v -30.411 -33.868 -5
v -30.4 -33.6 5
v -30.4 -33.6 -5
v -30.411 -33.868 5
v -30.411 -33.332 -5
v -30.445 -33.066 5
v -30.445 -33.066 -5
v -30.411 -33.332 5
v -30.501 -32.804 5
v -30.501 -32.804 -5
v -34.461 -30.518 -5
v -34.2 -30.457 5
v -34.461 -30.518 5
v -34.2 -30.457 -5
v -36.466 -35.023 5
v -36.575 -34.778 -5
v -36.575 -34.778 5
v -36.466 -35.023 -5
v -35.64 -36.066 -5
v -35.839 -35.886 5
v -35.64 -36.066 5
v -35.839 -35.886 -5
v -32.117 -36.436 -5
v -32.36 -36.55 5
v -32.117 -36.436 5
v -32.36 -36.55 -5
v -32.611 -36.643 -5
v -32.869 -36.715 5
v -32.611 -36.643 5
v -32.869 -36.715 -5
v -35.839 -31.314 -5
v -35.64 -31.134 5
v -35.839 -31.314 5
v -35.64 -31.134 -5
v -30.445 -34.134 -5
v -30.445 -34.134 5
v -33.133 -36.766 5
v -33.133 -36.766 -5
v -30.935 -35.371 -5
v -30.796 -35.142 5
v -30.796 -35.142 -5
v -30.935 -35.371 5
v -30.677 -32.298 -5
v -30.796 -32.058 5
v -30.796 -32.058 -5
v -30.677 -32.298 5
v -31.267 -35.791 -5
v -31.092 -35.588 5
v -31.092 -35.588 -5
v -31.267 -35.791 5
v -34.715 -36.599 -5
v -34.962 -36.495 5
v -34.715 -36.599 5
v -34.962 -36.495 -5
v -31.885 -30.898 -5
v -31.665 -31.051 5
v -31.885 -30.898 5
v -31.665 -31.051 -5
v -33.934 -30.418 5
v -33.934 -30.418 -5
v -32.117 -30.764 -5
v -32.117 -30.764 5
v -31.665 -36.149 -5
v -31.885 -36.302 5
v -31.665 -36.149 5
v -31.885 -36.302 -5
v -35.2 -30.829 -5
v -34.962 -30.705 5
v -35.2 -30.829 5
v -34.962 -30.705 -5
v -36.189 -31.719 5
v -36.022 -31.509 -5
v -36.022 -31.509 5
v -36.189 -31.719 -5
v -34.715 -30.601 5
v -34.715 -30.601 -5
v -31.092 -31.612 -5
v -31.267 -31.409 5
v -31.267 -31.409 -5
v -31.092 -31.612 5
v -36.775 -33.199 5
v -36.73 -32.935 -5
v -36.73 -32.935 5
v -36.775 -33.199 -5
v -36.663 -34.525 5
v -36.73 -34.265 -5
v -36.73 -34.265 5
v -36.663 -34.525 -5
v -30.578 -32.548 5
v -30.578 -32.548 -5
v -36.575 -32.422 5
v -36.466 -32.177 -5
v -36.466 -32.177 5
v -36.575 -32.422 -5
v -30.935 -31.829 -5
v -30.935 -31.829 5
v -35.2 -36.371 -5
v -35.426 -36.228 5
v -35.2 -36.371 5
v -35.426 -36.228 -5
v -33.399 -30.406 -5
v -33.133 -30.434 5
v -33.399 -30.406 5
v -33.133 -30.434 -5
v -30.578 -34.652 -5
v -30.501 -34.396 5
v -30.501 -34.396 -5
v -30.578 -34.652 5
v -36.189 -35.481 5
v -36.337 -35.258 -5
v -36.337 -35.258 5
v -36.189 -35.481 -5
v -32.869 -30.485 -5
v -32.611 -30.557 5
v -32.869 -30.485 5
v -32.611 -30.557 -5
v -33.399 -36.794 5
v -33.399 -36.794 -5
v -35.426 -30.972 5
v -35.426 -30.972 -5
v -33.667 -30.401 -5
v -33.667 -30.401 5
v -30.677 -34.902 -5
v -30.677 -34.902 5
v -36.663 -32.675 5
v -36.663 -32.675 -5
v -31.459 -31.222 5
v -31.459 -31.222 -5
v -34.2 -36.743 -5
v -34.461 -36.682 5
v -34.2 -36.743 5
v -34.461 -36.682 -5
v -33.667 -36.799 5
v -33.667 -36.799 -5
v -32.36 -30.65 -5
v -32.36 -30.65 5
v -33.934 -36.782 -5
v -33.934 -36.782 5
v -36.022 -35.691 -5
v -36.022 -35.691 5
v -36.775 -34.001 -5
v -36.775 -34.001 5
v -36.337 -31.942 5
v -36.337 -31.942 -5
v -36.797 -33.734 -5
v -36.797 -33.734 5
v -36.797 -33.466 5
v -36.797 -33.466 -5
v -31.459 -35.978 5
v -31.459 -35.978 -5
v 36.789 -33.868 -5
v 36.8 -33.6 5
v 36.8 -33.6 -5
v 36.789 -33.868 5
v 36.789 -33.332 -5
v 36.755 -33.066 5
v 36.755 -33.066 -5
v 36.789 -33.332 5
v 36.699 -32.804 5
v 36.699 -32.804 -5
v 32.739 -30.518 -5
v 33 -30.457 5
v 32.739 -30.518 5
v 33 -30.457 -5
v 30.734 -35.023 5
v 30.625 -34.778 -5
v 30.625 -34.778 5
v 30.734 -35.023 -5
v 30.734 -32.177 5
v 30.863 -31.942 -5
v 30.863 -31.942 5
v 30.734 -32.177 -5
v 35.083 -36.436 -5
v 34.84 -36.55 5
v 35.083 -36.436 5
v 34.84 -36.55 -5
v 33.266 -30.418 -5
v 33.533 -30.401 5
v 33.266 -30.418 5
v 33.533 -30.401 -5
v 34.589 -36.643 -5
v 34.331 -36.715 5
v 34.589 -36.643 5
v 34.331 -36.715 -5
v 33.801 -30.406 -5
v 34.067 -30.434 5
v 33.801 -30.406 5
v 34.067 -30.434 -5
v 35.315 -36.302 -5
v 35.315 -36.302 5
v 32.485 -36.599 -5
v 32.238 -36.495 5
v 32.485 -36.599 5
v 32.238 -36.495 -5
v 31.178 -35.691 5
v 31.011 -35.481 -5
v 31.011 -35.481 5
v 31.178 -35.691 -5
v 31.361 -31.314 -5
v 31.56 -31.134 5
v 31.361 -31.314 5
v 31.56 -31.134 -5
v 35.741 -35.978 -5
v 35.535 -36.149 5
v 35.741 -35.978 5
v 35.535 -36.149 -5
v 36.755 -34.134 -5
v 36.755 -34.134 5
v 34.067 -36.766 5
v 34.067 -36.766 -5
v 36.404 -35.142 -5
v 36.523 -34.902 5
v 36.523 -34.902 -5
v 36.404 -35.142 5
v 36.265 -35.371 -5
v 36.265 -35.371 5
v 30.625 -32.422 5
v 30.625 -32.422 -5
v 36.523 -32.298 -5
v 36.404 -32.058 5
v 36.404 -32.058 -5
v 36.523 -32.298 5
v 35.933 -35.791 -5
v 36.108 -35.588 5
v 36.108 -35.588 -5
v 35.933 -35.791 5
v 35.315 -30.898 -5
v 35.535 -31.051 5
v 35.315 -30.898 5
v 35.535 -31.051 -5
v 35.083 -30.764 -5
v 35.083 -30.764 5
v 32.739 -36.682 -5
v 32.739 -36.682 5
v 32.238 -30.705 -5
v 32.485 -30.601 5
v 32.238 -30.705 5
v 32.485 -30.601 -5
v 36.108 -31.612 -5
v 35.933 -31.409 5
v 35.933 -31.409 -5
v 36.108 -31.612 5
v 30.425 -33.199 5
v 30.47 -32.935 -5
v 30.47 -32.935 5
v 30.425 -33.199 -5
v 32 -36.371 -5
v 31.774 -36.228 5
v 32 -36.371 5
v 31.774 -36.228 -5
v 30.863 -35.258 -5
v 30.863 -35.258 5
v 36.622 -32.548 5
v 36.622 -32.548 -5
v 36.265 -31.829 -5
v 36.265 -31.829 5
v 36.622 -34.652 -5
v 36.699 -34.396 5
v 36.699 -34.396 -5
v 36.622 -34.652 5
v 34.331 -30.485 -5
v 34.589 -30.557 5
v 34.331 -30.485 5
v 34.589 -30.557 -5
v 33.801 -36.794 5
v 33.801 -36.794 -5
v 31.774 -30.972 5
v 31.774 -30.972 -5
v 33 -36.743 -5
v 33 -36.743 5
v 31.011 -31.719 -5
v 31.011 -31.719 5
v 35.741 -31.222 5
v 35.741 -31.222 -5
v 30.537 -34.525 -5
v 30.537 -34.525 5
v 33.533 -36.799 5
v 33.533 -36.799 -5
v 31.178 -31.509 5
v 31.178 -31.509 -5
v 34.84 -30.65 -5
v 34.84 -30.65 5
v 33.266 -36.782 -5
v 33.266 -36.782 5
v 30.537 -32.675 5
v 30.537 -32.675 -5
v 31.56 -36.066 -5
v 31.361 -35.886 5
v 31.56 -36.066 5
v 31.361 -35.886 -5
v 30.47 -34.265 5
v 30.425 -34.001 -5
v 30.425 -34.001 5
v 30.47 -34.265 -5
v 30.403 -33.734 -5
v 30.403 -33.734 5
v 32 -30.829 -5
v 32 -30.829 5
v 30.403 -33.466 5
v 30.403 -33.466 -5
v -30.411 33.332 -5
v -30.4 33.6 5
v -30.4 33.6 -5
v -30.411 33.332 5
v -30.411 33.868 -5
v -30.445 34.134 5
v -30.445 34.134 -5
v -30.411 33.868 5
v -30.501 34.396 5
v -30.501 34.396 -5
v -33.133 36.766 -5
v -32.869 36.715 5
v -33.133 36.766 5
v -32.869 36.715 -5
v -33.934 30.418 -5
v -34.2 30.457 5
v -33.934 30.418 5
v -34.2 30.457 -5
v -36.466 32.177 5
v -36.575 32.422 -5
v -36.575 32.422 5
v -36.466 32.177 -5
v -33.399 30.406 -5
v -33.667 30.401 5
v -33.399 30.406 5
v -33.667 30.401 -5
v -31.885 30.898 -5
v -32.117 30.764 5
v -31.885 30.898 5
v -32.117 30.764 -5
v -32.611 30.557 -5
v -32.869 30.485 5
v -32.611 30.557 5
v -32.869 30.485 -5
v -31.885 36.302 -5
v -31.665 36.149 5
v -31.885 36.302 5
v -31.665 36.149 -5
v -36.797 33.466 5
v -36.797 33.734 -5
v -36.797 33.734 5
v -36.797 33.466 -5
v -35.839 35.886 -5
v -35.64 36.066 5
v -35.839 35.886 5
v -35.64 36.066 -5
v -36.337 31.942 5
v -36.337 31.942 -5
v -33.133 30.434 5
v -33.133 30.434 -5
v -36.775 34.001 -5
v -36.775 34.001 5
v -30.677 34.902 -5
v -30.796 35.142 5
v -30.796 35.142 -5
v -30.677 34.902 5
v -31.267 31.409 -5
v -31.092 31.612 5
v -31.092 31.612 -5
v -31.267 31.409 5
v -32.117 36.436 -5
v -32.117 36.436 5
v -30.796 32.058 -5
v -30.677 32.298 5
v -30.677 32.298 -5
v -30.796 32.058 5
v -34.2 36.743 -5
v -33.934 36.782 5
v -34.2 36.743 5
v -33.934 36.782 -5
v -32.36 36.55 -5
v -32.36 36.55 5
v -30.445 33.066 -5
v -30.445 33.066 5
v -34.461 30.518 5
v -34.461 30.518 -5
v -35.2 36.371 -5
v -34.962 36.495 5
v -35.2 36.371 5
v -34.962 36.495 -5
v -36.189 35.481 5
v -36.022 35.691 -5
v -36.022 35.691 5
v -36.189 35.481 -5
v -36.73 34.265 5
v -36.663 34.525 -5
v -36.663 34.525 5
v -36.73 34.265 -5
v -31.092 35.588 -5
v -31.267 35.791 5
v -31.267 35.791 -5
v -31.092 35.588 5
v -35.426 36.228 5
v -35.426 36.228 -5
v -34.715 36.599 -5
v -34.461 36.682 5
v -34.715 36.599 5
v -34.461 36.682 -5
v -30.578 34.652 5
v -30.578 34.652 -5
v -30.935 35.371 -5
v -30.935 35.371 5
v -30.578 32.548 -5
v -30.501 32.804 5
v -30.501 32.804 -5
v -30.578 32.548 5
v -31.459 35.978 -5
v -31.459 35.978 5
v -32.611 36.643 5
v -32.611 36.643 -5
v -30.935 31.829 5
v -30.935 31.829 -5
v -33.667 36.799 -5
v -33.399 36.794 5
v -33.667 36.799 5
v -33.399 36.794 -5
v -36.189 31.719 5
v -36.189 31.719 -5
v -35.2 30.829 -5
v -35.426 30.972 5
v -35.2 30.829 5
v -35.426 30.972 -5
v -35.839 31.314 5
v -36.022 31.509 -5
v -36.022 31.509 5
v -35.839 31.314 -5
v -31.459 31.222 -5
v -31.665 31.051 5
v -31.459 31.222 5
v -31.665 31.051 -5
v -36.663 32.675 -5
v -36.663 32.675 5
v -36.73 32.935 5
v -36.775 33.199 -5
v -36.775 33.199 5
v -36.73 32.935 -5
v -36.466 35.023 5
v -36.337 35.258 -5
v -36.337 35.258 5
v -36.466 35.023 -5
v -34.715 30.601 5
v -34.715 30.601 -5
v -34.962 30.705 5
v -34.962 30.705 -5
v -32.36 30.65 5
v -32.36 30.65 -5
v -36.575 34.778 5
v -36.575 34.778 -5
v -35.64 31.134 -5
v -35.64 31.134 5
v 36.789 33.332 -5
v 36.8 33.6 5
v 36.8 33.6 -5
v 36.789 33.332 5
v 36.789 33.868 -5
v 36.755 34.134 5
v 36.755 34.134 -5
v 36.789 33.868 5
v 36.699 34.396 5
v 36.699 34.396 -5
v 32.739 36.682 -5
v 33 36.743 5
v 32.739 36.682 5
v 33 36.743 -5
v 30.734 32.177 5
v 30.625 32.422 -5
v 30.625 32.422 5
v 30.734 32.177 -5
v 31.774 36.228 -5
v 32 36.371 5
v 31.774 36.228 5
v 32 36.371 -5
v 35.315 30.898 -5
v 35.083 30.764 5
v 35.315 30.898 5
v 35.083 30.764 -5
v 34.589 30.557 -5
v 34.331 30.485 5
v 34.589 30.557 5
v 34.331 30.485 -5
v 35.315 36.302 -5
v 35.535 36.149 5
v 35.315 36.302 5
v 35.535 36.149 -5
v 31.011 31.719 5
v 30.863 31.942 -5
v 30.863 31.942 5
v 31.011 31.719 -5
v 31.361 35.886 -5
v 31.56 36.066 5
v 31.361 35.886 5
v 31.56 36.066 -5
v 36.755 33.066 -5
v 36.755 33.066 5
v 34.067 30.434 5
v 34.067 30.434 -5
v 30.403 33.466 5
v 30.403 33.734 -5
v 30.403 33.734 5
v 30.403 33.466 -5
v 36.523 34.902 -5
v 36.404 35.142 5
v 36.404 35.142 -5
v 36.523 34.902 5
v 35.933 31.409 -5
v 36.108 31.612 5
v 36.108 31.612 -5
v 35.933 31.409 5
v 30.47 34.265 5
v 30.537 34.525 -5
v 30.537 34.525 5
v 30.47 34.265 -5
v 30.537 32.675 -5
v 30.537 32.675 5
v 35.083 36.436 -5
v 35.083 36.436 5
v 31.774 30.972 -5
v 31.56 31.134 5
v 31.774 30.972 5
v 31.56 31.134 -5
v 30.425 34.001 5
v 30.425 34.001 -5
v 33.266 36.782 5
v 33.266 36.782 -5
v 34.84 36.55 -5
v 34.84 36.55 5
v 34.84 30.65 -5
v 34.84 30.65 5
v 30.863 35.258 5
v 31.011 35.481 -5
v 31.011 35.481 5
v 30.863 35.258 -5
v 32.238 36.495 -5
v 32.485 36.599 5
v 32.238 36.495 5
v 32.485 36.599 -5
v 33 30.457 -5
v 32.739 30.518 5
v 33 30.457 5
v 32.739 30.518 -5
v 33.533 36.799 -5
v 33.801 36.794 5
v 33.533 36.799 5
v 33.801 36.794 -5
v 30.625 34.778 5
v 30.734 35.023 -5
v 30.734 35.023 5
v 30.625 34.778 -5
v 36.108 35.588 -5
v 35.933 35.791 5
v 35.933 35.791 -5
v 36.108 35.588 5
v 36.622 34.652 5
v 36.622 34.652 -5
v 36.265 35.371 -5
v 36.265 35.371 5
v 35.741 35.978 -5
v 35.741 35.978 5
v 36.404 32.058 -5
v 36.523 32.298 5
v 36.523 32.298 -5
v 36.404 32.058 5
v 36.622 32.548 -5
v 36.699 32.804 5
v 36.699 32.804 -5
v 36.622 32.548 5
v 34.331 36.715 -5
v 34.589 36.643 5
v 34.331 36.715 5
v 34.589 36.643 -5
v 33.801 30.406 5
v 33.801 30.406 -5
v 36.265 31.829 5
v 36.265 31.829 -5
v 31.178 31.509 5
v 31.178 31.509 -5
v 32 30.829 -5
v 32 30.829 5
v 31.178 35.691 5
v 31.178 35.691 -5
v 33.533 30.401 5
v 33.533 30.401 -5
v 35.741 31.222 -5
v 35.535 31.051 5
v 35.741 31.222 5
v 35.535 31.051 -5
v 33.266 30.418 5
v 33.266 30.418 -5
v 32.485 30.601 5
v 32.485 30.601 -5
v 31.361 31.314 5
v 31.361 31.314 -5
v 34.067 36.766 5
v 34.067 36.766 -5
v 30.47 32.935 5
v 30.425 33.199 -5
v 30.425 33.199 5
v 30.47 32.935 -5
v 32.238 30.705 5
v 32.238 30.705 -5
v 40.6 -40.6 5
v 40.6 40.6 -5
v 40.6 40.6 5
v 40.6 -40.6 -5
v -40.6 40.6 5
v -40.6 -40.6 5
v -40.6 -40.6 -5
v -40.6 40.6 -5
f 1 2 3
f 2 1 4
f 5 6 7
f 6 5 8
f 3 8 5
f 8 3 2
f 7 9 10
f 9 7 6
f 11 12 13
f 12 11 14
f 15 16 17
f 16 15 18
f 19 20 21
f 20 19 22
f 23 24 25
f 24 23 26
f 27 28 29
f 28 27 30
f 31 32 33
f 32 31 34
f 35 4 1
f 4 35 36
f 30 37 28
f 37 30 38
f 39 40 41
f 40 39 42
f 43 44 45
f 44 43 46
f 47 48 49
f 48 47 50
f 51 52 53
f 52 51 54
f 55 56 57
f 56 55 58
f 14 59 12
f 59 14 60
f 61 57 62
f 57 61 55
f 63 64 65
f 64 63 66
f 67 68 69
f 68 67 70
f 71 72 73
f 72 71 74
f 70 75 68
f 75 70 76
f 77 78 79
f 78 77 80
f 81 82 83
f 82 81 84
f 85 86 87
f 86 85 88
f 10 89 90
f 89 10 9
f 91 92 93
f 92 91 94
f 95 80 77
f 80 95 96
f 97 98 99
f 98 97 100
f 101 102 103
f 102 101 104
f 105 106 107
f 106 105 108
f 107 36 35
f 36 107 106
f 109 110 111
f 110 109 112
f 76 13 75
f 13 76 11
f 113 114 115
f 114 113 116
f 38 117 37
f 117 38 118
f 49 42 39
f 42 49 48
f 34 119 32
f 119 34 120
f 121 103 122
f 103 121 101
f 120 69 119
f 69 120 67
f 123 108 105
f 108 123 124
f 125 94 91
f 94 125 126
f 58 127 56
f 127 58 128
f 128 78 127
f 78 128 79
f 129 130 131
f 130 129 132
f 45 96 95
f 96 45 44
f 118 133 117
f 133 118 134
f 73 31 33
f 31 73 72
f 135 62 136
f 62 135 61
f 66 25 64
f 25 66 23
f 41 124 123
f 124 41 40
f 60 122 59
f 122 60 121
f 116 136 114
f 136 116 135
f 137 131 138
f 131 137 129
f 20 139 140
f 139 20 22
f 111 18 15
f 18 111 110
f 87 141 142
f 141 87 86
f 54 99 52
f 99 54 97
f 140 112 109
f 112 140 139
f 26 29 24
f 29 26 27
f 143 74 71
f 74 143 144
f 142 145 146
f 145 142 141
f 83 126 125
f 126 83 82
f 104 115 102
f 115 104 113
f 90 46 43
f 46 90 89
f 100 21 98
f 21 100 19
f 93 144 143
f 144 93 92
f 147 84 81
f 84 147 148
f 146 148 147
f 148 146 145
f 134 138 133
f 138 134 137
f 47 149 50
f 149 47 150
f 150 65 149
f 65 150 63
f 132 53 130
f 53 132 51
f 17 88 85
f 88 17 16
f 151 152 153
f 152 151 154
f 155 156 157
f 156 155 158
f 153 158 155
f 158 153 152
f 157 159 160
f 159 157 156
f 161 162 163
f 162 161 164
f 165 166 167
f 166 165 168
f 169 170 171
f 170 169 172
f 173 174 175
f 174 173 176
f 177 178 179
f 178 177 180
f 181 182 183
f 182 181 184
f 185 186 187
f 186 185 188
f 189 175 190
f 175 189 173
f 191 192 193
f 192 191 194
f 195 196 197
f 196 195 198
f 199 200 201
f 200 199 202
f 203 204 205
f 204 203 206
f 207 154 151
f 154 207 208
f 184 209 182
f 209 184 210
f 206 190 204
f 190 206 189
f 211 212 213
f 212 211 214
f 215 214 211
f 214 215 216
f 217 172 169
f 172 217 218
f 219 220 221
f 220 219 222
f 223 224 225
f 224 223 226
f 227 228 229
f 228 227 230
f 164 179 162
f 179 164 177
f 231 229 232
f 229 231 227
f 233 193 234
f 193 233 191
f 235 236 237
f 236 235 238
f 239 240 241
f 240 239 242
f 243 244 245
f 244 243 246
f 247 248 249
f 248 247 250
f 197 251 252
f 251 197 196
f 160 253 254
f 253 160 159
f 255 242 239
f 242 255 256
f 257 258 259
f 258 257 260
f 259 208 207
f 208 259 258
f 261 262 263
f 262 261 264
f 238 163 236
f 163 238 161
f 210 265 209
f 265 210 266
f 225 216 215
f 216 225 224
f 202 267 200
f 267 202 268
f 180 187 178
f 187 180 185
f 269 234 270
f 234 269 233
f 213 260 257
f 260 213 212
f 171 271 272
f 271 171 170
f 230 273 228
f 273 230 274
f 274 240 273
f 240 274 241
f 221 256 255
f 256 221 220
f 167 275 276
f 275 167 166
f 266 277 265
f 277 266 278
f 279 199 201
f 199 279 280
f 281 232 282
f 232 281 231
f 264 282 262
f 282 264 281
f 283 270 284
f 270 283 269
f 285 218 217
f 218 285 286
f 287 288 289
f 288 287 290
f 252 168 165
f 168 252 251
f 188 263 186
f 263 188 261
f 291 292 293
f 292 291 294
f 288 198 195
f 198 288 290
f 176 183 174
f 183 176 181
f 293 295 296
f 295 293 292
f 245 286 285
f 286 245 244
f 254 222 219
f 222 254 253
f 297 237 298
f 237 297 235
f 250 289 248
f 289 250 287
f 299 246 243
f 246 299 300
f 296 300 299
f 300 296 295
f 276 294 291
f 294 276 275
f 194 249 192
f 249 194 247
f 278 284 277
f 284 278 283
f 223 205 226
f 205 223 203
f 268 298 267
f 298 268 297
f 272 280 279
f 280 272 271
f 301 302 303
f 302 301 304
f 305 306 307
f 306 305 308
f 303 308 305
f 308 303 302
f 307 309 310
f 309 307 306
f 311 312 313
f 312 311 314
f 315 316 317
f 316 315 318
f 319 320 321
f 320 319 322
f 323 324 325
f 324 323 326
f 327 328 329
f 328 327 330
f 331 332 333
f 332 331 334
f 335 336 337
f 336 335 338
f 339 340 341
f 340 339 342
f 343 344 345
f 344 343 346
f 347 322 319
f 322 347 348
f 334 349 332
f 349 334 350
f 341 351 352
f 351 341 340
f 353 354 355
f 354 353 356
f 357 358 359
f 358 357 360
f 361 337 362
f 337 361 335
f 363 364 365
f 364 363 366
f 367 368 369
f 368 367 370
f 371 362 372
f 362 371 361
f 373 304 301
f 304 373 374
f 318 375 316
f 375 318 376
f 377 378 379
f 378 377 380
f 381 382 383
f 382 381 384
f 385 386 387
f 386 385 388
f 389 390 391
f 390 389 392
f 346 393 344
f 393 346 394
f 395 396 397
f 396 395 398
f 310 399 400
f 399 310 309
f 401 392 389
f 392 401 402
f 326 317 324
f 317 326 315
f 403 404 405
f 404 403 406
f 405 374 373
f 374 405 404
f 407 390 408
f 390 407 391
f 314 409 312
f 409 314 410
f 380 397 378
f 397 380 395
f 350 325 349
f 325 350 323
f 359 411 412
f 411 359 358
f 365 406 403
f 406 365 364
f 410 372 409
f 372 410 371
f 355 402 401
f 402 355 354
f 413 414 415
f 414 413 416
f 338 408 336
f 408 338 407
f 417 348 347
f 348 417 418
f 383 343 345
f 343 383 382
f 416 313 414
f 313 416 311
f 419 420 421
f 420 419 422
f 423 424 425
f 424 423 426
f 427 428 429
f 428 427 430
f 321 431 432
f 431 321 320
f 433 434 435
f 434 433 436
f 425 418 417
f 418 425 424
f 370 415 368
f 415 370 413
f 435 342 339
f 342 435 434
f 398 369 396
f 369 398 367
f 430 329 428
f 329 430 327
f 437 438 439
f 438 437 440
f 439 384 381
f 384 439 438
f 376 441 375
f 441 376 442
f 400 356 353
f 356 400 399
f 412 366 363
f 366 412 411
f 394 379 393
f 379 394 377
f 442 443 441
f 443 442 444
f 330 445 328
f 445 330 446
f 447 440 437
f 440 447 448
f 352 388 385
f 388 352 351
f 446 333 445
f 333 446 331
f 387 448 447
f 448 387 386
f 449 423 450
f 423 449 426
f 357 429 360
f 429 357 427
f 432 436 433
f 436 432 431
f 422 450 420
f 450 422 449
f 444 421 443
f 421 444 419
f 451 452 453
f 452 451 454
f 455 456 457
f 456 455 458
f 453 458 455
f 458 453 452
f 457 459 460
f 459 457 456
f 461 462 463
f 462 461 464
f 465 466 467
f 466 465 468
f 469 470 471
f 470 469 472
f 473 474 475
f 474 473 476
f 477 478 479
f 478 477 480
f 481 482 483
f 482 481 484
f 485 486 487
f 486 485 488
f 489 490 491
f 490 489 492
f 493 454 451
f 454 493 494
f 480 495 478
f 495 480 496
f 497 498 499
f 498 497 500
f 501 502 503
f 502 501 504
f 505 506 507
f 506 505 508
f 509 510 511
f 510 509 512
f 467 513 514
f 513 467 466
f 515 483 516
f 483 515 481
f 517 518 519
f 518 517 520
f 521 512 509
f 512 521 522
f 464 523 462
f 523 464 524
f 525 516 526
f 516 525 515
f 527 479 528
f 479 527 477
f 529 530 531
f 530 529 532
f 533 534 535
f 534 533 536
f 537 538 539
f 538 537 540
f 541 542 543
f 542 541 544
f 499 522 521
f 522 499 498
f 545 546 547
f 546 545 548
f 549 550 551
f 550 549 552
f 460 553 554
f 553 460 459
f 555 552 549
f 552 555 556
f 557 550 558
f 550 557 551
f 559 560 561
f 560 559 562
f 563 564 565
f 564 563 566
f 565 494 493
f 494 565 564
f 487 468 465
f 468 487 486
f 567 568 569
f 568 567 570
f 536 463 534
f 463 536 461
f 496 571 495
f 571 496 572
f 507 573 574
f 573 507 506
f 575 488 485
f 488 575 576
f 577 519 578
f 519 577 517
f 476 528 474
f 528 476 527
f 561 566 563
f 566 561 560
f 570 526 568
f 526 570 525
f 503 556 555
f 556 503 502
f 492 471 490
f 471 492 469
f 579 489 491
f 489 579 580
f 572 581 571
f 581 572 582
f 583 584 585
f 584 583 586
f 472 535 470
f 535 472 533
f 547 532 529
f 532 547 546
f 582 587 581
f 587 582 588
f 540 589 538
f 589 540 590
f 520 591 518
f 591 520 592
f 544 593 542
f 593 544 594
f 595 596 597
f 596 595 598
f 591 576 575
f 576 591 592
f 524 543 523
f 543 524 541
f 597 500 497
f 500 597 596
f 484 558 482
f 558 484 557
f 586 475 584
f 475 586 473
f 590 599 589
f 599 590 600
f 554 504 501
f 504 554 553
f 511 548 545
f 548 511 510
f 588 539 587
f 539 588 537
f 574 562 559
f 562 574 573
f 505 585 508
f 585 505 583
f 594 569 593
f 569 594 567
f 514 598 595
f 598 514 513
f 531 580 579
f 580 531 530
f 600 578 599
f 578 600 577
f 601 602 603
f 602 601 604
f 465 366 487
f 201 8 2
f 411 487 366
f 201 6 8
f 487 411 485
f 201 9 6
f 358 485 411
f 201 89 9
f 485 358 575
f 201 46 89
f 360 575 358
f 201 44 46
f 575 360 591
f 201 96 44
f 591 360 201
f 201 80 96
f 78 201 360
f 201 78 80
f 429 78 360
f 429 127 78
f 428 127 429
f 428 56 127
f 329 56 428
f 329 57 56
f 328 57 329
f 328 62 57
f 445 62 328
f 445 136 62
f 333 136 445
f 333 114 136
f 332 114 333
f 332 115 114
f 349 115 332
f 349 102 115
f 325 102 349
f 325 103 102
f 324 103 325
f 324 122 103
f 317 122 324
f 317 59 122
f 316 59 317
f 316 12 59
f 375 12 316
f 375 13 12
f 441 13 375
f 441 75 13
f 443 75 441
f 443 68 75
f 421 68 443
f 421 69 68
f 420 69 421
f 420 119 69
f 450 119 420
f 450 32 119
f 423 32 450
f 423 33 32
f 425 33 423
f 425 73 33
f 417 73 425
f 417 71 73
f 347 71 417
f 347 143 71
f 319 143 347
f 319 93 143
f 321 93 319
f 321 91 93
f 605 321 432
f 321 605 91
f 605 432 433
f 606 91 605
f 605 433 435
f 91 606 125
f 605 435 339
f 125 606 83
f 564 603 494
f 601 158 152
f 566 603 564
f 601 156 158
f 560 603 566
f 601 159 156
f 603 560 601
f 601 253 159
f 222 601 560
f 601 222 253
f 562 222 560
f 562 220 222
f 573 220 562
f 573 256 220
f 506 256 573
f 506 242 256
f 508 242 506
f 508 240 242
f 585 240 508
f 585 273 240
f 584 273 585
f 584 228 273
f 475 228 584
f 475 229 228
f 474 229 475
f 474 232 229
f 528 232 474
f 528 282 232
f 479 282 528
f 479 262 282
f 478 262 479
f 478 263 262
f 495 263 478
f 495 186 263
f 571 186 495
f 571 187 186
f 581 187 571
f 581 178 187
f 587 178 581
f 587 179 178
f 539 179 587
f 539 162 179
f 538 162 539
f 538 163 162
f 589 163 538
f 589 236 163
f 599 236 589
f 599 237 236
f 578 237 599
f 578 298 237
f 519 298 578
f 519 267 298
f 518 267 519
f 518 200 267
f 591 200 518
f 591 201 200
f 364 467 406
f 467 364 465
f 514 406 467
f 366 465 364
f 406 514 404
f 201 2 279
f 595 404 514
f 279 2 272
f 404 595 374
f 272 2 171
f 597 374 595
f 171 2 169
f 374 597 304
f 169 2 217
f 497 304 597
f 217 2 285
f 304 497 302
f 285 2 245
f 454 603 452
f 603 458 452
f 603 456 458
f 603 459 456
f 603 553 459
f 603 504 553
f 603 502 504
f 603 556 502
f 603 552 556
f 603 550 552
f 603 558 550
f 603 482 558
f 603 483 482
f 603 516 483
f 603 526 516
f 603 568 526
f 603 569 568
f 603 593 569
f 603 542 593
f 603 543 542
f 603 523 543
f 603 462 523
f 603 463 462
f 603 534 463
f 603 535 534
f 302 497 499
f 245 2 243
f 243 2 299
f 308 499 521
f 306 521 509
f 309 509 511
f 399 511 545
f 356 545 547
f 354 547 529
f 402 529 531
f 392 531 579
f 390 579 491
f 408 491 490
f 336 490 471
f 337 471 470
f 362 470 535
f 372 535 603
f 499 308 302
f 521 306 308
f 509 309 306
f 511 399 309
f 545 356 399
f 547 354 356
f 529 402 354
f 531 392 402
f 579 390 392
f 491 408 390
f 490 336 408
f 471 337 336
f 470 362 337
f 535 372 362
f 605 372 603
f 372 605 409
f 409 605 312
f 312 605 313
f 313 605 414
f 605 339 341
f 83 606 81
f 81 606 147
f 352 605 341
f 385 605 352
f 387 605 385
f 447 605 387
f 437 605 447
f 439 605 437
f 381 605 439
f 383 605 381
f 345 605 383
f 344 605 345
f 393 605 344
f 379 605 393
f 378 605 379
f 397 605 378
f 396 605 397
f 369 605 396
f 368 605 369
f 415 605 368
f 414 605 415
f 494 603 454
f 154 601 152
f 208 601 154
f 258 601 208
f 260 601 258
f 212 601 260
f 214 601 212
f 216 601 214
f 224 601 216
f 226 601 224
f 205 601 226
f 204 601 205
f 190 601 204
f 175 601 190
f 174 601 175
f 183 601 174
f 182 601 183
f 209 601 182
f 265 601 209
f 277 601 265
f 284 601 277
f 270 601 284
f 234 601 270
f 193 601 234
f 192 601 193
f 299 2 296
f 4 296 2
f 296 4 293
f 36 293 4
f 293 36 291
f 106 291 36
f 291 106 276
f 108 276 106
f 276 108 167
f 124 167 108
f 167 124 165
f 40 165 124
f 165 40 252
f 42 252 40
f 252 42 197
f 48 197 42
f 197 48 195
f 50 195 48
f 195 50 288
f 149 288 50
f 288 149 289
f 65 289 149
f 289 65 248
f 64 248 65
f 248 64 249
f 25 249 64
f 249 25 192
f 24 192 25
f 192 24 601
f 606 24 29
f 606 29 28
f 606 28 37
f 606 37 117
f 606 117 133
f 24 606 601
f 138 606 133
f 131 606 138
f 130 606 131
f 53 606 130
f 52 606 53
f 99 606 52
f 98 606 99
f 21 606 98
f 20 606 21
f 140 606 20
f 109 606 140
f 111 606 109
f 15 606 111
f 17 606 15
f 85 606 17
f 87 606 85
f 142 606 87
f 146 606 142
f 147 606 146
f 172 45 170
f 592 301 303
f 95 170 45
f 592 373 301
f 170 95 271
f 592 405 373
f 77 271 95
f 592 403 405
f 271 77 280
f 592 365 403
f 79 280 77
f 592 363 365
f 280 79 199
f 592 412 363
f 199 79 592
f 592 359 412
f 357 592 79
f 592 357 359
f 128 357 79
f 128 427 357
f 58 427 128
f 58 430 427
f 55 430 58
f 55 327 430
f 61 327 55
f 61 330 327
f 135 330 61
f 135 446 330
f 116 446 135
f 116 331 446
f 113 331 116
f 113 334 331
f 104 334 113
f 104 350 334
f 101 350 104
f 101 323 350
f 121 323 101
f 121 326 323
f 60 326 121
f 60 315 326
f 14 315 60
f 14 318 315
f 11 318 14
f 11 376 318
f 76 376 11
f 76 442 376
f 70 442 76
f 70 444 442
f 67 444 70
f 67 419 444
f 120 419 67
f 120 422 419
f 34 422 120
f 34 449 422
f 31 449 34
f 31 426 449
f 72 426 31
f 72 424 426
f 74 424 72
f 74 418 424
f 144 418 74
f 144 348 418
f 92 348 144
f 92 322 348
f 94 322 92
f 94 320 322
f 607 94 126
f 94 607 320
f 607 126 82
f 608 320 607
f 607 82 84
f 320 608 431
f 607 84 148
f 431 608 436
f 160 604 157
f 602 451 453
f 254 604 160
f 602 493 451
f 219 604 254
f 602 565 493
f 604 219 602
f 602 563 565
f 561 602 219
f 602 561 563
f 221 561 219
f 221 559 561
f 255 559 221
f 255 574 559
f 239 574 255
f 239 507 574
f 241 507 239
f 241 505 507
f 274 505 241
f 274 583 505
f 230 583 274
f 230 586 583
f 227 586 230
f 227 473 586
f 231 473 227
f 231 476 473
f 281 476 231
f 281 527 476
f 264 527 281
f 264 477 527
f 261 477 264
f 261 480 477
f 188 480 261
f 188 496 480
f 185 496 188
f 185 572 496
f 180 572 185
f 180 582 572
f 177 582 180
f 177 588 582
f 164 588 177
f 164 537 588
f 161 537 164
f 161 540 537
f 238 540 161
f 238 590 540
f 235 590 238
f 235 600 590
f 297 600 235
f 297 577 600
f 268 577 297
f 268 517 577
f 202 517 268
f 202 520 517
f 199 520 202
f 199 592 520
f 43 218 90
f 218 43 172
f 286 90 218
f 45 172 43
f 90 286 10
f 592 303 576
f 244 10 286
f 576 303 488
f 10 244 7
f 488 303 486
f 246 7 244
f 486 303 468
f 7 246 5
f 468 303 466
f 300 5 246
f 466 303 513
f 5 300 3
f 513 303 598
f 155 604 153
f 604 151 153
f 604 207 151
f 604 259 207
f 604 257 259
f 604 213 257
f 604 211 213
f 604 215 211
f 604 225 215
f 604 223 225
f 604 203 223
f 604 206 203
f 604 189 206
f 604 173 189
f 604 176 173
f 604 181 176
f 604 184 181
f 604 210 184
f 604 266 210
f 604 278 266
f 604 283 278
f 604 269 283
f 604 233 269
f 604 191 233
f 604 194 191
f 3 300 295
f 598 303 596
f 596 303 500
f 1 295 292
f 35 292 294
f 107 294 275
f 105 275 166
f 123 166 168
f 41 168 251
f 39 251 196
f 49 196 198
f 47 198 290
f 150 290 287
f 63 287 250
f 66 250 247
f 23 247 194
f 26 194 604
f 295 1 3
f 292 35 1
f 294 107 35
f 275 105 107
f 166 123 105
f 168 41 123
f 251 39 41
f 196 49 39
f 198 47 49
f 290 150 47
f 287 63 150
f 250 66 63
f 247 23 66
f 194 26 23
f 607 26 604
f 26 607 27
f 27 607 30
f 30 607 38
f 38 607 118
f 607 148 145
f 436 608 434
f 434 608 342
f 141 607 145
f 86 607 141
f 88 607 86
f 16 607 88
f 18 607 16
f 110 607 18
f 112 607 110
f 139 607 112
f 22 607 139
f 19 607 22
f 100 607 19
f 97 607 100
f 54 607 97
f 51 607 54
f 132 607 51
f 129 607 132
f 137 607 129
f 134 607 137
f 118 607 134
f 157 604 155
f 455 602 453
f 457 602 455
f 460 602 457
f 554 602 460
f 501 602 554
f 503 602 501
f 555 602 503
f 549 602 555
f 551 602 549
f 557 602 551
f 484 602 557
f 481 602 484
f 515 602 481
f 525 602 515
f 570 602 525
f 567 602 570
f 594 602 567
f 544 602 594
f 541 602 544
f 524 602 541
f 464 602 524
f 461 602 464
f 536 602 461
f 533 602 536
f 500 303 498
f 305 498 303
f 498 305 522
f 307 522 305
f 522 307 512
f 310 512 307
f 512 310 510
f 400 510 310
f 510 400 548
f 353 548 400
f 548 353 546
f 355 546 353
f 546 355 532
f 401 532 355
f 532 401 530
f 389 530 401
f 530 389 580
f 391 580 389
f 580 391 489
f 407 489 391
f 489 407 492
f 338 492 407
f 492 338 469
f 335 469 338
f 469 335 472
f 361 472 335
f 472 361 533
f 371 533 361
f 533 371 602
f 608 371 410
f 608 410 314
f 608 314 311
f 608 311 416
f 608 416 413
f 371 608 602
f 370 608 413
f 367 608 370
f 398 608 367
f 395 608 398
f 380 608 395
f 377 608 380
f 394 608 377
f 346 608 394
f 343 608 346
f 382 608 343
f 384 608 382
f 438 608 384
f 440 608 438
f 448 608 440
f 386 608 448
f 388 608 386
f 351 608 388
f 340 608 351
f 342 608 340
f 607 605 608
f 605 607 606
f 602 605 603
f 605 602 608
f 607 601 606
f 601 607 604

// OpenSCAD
// file: hex_display_params.scad
//
// Paramters for hex display
// 
screw_extra     = 25.0;
glass_height    = 56.0;
glass_width     = 56.0;
glass_thickness = 2.0;
led_base_width  = 2.55;
led_base_height = 4.9;
led_base_depth  = 3.5;
led_top_radius  = (1.99/2.0);
led_top_height  = 4.3;

glass_slit_thickness = glass_thickness+0.1;
glass_slit_width  = glass_width+0.2;
glass_slit_height = glass_height+0.2;
glass_slit_spacing = 2.5;
glass_slit_margin  = 2.0;    // depth of slit on every side

block_side = glass_slit_width+screw_extra;
block_depth = 6.0+(glass_slit_spacing+glass_slit_thickness)*16+6.0;
hole_width  = glass_width-(glass_slit_margin*2);
hole_height = glass_height-(glass_slit_margin*2);
hole_depth = block_depth + 2.0;

screw_hole_r = 3.2;
screw_hole_inset = (block_side-14)/2;
block_border = (block_side-hole_height)/2;
// main file
$fn = 75;

include <hex_display_params.scad>

lid_thickness = 10;

module Object()
{
    difference() {
	cube([block_side,block_side,lid_thickness],center=true);
	union() {
	    translate([-screw_hole_inset,-screw_hole_inset,0])
		cylinder(r=screw_hole_r,h=lid_thickness+1.0,center=true);
	    translate([screw_hole_inset,-screw_hole_inset,0])
		cylinder(r=screw_hole_r,h=lid_thickness+1.0,center=true);
	    translate([-screw_hole_inset,screw_hole_inset,0])
		cylinder(r=screw_hole_r,h=lid_thickness+1.0,center=true);
	    translate([screw_hole_inset,screw_hole_inset,0])
		cylinder(r=screw_hole_r,h=lid_thickness+1.0,center=true);
	}
    }	
}

Object();
